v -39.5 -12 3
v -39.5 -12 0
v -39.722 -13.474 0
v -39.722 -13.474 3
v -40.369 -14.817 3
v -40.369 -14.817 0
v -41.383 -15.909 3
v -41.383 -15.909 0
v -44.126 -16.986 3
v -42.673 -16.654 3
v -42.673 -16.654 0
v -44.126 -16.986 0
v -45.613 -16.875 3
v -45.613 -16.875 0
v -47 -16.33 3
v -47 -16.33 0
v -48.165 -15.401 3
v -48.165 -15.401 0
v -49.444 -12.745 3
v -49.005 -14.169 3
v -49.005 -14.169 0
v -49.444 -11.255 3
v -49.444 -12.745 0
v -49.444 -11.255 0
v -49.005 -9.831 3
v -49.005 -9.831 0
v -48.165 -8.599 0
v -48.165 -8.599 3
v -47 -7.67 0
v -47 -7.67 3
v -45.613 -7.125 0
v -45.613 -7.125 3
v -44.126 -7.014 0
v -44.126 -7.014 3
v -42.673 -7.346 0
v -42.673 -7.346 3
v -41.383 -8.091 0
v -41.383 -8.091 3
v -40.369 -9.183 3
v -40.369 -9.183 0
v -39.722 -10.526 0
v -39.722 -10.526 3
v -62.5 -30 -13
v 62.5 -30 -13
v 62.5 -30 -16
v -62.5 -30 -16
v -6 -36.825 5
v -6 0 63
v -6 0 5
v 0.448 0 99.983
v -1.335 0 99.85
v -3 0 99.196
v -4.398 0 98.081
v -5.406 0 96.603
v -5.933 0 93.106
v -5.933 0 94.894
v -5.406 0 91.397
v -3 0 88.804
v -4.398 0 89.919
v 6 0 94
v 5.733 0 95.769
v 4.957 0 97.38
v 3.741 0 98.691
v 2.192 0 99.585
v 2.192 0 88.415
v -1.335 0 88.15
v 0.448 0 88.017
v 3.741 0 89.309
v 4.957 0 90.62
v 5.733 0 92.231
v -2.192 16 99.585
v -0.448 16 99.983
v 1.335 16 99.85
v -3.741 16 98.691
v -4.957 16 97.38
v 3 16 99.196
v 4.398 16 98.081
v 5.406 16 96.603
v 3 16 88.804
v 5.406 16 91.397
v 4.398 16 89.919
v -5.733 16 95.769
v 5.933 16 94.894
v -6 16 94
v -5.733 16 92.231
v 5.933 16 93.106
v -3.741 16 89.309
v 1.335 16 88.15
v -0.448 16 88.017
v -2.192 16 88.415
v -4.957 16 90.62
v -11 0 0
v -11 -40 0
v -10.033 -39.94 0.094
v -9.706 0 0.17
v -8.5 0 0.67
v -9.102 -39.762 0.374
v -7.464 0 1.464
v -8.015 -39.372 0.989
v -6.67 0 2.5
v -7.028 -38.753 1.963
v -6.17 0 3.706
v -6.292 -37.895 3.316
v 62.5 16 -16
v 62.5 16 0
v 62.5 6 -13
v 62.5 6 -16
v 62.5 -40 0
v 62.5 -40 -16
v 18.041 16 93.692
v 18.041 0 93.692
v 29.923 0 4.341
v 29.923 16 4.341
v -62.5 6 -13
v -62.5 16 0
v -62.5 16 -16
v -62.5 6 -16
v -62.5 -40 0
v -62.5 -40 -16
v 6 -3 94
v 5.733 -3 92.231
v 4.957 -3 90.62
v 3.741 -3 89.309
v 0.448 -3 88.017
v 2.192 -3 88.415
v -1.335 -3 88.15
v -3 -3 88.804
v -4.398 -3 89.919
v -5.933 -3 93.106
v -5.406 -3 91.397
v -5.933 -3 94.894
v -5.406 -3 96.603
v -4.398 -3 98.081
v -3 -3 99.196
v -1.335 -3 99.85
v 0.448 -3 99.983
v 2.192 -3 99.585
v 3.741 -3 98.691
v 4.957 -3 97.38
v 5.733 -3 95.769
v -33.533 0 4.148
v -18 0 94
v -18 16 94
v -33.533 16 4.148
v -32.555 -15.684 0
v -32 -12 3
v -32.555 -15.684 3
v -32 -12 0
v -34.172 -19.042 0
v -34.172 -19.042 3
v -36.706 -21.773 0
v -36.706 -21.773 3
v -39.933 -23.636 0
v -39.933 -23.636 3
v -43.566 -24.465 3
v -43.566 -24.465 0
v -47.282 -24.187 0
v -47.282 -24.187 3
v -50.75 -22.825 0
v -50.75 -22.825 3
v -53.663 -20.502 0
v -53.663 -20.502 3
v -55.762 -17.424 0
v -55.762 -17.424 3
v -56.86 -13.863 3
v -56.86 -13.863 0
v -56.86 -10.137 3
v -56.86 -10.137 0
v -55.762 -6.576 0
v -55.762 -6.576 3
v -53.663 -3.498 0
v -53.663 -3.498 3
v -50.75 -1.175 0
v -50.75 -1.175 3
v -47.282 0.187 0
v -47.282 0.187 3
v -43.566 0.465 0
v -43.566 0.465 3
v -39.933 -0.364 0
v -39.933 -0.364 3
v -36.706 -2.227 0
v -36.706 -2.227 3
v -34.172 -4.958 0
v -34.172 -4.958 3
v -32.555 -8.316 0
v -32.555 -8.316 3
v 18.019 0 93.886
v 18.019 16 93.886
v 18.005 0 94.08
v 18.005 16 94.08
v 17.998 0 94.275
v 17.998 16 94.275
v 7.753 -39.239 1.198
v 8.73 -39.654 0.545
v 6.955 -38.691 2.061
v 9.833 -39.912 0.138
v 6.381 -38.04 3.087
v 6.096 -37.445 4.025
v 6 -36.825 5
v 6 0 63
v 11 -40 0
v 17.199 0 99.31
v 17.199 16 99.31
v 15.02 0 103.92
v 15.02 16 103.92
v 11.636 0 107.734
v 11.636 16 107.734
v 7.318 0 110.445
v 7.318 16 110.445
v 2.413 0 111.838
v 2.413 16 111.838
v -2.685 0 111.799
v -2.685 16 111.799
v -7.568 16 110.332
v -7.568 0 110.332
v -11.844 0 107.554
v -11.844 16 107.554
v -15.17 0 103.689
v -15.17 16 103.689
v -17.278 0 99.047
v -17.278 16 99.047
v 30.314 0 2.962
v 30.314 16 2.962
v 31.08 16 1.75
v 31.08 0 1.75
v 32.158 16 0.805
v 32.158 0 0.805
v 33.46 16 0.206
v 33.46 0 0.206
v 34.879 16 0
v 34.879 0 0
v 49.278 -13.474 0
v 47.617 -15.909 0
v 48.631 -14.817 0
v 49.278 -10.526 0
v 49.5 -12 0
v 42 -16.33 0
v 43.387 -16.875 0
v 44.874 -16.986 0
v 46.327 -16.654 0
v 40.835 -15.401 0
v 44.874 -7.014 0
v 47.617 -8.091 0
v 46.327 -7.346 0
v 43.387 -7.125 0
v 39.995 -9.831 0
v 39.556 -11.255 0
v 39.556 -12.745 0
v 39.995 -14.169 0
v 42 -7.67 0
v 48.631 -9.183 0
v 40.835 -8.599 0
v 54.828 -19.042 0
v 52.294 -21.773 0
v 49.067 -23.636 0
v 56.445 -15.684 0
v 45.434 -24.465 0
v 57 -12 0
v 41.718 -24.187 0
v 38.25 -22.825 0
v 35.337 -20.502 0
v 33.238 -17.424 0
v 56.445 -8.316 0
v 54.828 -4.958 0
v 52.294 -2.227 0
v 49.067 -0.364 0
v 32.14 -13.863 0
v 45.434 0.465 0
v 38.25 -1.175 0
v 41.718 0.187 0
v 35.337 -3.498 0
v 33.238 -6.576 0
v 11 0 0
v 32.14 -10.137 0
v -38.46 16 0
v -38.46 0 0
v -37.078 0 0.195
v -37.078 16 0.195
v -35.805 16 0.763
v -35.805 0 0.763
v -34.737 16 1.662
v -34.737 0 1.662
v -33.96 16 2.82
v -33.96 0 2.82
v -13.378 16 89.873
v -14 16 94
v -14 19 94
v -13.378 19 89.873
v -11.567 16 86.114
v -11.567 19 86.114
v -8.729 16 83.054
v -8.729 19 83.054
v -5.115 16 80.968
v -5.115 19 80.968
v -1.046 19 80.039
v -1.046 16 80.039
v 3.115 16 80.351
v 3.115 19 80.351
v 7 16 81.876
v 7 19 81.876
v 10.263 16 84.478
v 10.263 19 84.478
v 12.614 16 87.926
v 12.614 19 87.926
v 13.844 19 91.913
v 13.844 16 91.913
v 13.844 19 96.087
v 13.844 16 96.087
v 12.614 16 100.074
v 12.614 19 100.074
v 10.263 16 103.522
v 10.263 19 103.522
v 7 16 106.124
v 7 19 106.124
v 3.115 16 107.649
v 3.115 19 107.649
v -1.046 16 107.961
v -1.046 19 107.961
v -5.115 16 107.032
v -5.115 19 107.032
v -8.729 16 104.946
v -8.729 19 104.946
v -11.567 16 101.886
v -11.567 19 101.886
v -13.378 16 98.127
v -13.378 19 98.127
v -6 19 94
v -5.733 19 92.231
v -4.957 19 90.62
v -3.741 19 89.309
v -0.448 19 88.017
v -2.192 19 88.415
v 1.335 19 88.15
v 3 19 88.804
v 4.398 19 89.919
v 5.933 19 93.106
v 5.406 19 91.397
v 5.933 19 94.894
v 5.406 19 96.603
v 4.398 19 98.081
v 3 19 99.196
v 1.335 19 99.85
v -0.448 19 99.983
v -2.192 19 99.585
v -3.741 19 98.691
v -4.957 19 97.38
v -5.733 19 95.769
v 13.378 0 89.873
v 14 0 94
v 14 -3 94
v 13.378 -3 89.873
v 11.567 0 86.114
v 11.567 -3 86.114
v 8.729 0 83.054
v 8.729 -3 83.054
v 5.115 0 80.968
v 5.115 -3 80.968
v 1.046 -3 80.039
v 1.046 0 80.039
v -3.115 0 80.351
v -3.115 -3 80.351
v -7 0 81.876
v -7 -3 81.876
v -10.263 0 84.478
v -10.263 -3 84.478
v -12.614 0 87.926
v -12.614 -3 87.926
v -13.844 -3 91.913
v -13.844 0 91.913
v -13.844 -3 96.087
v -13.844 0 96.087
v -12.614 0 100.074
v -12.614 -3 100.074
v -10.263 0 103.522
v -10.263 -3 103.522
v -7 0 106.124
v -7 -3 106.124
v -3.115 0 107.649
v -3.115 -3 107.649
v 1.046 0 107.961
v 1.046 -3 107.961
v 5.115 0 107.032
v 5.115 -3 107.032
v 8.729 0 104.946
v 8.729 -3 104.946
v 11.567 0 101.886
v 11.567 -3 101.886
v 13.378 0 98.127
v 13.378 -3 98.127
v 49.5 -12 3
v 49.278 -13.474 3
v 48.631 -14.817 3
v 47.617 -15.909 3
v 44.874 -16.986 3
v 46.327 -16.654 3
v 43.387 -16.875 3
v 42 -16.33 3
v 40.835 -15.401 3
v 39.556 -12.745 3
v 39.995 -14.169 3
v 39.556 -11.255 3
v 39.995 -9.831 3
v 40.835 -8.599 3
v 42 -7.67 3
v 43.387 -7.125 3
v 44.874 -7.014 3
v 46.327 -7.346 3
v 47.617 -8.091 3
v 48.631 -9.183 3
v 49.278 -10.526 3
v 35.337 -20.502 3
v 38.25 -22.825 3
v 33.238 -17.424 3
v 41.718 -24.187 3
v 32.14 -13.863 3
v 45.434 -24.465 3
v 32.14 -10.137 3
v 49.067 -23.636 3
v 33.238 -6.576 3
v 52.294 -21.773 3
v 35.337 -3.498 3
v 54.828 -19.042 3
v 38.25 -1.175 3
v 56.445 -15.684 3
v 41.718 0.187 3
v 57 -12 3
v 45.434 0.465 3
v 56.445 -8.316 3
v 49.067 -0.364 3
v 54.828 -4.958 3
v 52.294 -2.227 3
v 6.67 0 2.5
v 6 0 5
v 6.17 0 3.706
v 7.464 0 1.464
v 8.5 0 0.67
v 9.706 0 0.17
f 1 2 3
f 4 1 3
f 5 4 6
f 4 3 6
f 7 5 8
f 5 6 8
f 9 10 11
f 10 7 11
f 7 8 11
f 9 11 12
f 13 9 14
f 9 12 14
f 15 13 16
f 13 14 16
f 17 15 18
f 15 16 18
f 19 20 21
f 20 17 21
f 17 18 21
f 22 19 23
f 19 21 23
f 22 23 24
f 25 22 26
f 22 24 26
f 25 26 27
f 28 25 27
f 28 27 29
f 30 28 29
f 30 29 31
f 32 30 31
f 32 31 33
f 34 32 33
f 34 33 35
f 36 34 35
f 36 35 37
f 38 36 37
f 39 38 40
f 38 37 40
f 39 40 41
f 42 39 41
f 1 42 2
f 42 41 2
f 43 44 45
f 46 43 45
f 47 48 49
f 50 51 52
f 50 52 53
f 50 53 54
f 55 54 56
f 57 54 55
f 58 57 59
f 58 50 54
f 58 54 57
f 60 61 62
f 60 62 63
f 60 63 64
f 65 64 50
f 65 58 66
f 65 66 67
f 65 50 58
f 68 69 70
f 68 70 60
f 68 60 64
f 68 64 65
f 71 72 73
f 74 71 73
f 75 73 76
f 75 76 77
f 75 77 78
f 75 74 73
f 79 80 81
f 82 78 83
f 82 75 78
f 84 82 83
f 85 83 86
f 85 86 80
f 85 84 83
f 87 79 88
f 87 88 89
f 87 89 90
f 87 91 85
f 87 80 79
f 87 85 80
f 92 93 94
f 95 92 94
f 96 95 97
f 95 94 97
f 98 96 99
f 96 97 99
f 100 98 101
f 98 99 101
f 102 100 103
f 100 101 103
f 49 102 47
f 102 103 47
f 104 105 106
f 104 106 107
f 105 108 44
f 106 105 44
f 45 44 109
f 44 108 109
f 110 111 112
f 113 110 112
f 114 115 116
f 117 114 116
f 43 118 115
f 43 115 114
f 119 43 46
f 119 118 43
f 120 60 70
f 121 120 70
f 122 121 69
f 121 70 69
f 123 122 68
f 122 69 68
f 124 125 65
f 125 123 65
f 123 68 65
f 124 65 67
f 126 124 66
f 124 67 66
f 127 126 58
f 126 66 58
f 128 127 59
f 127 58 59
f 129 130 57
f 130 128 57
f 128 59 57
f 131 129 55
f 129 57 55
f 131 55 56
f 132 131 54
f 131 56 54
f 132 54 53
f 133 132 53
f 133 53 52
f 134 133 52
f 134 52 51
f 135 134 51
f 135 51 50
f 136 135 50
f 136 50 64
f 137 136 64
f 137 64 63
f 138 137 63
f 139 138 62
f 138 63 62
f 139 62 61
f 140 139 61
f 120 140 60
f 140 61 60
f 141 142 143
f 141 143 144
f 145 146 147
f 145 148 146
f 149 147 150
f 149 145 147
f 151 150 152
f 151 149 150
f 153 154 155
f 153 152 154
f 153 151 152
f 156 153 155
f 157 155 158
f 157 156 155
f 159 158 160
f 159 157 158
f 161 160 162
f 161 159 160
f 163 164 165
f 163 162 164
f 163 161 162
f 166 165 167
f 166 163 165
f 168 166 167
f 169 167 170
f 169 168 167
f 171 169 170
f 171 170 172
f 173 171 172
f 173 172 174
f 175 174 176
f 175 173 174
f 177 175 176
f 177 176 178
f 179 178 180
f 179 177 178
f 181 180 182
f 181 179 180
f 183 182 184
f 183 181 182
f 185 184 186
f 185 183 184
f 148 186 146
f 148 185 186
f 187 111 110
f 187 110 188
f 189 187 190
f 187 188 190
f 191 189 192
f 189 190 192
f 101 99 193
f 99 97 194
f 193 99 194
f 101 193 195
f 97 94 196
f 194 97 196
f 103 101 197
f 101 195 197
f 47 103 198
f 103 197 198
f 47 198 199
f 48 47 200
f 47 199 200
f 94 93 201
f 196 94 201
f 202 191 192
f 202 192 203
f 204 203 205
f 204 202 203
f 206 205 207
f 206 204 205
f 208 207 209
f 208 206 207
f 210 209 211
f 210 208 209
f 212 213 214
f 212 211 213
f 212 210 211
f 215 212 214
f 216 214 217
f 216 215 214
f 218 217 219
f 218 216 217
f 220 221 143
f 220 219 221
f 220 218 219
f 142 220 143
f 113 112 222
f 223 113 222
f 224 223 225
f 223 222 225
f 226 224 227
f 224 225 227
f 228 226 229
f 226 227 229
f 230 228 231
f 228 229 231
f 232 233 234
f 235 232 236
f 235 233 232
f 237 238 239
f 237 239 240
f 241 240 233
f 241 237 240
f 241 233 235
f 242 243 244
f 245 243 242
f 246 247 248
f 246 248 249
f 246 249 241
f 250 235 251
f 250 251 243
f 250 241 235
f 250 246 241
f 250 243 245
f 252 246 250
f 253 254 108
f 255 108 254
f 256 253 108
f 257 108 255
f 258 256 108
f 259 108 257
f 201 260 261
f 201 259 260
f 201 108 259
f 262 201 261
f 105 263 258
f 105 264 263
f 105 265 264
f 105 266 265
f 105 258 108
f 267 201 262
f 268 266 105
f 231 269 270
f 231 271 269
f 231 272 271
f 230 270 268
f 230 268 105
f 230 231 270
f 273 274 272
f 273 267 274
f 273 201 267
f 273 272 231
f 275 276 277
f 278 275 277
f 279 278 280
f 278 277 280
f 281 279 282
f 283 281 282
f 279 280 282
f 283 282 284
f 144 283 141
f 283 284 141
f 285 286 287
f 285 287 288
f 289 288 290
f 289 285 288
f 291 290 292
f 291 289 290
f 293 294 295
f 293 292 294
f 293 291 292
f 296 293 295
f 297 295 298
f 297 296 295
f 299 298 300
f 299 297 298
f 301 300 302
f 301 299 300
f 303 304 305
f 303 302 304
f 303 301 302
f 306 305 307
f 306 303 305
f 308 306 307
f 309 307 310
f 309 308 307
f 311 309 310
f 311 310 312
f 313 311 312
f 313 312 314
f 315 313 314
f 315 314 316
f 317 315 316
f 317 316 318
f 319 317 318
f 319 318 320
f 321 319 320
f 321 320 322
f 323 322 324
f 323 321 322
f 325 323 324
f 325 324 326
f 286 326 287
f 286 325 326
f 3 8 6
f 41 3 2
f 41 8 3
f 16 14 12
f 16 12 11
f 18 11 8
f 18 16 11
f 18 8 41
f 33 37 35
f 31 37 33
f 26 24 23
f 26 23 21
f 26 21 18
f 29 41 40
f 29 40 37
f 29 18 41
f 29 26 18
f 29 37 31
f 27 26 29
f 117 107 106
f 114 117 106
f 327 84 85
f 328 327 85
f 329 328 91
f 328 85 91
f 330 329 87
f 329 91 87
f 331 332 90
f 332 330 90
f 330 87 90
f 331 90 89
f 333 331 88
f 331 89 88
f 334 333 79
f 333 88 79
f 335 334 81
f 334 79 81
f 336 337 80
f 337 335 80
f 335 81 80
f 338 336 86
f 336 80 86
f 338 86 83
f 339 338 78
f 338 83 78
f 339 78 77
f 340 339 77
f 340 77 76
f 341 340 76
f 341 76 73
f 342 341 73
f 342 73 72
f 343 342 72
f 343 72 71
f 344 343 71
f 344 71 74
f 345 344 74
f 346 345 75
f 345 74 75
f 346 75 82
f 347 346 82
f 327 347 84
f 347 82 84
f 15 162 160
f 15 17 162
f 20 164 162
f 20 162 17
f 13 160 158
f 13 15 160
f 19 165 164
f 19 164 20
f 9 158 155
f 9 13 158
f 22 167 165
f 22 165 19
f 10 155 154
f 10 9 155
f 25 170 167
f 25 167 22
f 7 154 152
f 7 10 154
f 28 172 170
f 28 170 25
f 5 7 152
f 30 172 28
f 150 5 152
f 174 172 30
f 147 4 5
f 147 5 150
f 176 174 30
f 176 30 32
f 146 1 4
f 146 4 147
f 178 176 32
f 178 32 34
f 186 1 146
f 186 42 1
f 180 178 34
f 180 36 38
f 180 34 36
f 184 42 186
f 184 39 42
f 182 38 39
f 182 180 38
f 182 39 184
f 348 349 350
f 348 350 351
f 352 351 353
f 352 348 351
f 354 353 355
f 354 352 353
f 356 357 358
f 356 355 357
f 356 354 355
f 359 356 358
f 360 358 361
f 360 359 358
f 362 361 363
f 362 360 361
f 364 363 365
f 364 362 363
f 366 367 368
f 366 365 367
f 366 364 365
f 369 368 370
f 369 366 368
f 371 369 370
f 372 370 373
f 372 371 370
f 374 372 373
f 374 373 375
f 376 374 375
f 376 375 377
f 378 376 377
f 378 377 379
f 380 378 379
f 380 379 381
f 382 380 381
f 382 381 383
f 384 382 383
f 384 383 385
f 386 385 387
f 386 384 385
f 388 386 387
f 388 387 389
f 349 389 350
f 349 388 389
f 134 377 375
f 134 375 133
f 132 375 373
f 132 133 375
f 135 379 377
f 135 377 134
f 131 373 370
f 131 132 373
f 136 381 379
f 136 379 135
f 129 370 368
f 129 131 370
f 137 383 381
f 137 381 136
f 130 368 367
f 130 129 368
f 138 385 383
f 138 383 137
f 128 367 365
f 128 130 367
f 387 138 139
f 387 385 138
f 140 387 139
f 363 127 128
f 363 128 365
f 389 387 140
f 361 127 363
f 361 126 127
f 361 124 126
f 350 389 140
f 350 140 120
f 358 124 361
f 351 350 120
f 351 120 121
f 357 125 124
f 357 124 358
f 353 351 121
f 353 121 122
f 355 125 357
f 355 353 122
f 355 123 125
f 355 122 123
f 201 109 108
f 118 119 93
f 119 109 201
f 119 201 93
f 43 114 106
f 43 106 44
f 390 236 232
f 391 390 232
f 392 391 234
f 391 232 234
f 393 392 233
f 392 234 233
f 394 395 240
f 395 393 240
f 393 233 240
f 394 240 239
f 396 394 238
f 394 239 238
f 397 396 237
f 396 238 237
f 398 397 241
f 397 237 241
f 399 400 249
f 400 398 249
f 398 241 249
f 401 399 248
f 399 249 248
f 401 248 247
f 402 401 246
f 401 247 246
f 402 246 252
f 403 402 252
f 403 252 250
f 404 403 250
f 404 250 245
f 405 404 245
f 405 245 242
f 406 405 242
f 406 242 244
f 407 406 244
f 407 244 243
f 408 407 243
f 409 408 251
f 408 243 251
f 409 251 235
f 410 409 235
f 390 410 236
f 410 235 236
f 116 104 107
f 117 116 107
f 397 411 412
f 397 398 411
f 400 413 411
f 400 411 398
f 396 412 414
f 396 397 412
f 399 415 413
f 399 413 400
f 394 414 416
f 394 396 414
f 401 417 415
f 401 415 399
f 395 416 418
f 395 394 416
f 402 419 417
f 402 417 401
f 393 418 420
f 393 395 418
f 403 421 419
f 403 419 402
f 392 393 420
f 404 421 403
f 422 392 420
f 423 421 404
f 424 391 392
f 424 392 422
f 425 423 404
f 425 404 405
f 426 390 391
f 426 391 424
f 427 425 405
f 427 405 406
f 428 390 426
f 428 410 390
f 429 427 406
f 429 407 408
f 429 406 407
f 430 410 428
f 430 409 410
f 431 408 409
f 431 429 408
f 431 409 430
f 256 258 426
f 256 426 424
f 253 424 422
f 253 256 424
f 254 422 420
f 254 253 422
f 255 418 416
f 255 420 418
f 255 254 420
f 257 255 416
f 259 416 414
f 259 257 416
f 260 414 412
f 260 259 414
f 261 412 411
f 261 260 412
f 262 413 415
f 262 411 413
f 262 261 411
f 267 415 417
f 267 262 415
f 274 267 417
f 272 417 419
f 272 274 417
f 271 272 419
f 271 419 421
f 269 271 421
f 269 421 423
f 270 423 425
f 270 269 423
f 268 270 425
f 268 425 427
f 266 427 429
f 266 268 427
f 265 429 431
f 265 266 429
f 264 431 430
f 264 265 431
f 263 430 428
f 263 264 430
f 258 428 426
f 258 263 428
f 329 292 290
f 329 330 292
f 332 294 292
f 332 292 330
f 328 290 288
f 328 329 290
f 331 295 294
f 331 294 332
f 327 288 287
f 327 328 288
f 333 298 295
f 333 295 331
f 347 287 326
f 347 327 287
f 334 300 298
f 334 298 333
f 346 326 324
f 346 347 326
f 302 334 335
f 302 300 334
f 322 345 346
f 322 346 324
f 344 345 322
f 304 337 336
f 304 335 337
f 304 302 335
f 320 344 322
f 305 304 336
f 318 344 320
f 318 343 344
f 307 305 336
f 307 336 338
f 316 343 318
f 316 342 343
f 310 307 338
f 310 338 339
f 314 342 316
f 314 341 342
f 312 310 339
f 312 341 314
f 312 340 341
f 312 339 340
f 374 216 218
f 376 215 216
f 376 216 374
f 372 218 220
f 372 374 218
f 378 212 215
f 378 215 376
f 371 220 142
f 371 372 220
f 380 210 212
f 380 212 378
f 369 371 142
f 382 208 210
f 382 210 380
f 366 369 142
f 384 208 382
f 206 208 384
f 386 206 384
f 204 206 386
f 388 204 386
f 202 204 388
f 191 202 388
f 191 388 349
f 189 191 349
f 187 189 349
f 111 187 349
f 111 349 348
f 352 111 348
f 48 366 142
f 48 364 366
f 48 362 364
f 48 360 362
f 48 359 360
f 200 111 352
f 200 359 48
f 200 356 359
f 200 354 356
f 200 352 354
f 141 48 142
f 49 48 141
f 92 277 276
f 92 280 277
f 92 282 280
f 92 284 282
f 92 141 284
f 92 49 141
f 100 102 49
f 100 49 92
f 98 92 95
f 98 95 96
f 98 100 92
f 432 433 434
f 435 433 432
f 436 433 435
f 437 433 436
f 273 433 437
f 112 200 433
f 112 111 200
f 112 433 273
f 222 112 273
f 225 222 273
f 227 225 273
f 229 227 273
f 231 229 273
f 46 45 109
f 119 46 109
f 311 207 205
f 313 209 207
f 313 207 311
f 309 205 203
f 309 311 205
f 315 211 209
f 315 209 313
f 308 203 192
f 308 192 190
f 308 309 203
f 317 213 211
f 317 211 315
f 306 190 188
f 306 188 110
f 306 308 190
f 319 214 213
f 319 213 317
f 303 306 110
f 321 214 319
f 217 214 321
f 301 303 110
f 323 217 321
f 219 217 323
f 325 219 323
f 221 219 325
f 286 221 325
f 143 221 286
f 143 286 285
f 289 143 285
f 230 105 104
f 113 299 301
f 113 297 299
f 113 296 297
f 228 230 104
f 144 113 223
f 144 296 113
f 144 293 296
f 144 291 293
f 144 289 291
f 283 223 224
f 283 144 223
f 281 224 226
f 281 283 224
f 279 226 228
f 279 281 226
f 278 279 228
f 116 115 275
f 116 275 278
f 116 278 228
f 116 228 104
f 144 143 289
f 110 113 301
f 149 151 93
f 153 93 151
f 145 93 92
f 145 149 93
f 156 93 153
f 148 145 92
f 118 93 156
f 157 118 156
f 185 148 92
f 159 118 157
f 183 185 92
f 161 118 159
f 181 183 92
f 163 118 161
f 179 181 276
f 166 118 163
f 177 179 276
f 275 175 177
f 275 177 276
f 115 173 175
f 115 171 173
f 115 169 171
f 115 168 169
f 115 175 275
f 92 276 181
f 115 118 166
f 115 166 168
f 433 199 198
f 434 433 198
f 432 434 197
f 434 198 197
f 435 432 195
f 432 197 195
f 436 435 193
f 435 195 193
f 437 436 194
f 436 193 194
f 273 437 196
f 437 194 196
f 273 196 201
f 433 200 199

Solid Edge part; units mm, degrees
sketch "Sketch1" plane through (0, 0, 0) normal (1, 0, 0) x (0, 1, 0)
  line L0 (-40, 0) -> (0, 63)
  line L1 (0, 0) -> (0, 63)
  line L2 (-40, 0) -> (0, 0)
extrude "Protrusion1" add sketch "Sketch1" along normal mid plane 12
sketch "Sketch2" plane through (0, 0, 0) normal (1, 0, 0) x (0, 1, 0)
  line L0 (-40, 0) -> (0, 0)
  line L1 (16, 0) -> (0, 0)
  line L2 (16, 0) -> (16, -16)
  line L3 (16, -16) -> (-40, -16)
  line L4 (-40, -16) -> (-40, 0)
extrude "Protrusion_2" add sketch "Sketch2" along normal mid plane 125
sketch "Sketch3" plane through (62.5, -12, 48) normal (1, 0, 0) x (0, 1, 0)
  line L0 (18, -64) -> (18, -61)
  line L1 (18, -61) -> (-18, -61)
  line L2 (-18, -61) -> (-18, -64)
  line L3 (-18, -64) -> (18, -64)
extrude "ExtrudedCutout_1" cut sketch "Sketch3" against normal blind 151
sketch "Sketch4" plane through (0, 0, 56) normal (0, -1, 0) x (1, 0, 0)
  line L0 (-18, 38) -> (-34.25, -56)
  line L1 (30.5, -56) -> (-34.25, -56)
  line L2 (18, 38) -> (30.5, -56)
  arc A0 (-18, 38) -> (18, 38) centre (0, 38) cw
extrude "Protrusion_3" add sketch "Sketch4" against normal blind 16
sketch "Sketch5" plane through (-34.25, -12, 0) normal (0, 0, 1) x (1, 0, 0)
  circle A0 centre (78.75, 0) radius 12.5
  circle A1 centre (78.75, 0) radius 5
  circle A2 centre (-10.25, 0) radius 12.5
  circle A3 centre (-10.25, 0) radius 5
extrude "Protrusion2" add sketch "Sketch5" along normal blind 3
sketch "Sketch6" plane through (-1.875, 0, 56) normal (0, -1, 0) x (1, 0, 0)
  circle A0 centre (1.875, 38) radius 6
  circle A1 centre (1.875, 38) radius 14
extrude "Protrusion_5" add sketch "Sketch6" along normal blind 3
sketch "Sketch7" plane through (0, 16, 48) normal (0, 1, 0) x (-1, 0, 0)
  circle A0 centre (0, 46) radius 6
  circle A1 centre (0, 46) radius 14
extrude "Protrusion3" add sketch "Sketch7" along normal blind 3
fillet "Round_1" radius 5 4 edges at (6, -20, 0) (-6, -20, 0) (30.5, 8, 0) (-34.25, 8, 0)
fillet "Round_2" radius 5 1 edges at (18, 8, 94)
